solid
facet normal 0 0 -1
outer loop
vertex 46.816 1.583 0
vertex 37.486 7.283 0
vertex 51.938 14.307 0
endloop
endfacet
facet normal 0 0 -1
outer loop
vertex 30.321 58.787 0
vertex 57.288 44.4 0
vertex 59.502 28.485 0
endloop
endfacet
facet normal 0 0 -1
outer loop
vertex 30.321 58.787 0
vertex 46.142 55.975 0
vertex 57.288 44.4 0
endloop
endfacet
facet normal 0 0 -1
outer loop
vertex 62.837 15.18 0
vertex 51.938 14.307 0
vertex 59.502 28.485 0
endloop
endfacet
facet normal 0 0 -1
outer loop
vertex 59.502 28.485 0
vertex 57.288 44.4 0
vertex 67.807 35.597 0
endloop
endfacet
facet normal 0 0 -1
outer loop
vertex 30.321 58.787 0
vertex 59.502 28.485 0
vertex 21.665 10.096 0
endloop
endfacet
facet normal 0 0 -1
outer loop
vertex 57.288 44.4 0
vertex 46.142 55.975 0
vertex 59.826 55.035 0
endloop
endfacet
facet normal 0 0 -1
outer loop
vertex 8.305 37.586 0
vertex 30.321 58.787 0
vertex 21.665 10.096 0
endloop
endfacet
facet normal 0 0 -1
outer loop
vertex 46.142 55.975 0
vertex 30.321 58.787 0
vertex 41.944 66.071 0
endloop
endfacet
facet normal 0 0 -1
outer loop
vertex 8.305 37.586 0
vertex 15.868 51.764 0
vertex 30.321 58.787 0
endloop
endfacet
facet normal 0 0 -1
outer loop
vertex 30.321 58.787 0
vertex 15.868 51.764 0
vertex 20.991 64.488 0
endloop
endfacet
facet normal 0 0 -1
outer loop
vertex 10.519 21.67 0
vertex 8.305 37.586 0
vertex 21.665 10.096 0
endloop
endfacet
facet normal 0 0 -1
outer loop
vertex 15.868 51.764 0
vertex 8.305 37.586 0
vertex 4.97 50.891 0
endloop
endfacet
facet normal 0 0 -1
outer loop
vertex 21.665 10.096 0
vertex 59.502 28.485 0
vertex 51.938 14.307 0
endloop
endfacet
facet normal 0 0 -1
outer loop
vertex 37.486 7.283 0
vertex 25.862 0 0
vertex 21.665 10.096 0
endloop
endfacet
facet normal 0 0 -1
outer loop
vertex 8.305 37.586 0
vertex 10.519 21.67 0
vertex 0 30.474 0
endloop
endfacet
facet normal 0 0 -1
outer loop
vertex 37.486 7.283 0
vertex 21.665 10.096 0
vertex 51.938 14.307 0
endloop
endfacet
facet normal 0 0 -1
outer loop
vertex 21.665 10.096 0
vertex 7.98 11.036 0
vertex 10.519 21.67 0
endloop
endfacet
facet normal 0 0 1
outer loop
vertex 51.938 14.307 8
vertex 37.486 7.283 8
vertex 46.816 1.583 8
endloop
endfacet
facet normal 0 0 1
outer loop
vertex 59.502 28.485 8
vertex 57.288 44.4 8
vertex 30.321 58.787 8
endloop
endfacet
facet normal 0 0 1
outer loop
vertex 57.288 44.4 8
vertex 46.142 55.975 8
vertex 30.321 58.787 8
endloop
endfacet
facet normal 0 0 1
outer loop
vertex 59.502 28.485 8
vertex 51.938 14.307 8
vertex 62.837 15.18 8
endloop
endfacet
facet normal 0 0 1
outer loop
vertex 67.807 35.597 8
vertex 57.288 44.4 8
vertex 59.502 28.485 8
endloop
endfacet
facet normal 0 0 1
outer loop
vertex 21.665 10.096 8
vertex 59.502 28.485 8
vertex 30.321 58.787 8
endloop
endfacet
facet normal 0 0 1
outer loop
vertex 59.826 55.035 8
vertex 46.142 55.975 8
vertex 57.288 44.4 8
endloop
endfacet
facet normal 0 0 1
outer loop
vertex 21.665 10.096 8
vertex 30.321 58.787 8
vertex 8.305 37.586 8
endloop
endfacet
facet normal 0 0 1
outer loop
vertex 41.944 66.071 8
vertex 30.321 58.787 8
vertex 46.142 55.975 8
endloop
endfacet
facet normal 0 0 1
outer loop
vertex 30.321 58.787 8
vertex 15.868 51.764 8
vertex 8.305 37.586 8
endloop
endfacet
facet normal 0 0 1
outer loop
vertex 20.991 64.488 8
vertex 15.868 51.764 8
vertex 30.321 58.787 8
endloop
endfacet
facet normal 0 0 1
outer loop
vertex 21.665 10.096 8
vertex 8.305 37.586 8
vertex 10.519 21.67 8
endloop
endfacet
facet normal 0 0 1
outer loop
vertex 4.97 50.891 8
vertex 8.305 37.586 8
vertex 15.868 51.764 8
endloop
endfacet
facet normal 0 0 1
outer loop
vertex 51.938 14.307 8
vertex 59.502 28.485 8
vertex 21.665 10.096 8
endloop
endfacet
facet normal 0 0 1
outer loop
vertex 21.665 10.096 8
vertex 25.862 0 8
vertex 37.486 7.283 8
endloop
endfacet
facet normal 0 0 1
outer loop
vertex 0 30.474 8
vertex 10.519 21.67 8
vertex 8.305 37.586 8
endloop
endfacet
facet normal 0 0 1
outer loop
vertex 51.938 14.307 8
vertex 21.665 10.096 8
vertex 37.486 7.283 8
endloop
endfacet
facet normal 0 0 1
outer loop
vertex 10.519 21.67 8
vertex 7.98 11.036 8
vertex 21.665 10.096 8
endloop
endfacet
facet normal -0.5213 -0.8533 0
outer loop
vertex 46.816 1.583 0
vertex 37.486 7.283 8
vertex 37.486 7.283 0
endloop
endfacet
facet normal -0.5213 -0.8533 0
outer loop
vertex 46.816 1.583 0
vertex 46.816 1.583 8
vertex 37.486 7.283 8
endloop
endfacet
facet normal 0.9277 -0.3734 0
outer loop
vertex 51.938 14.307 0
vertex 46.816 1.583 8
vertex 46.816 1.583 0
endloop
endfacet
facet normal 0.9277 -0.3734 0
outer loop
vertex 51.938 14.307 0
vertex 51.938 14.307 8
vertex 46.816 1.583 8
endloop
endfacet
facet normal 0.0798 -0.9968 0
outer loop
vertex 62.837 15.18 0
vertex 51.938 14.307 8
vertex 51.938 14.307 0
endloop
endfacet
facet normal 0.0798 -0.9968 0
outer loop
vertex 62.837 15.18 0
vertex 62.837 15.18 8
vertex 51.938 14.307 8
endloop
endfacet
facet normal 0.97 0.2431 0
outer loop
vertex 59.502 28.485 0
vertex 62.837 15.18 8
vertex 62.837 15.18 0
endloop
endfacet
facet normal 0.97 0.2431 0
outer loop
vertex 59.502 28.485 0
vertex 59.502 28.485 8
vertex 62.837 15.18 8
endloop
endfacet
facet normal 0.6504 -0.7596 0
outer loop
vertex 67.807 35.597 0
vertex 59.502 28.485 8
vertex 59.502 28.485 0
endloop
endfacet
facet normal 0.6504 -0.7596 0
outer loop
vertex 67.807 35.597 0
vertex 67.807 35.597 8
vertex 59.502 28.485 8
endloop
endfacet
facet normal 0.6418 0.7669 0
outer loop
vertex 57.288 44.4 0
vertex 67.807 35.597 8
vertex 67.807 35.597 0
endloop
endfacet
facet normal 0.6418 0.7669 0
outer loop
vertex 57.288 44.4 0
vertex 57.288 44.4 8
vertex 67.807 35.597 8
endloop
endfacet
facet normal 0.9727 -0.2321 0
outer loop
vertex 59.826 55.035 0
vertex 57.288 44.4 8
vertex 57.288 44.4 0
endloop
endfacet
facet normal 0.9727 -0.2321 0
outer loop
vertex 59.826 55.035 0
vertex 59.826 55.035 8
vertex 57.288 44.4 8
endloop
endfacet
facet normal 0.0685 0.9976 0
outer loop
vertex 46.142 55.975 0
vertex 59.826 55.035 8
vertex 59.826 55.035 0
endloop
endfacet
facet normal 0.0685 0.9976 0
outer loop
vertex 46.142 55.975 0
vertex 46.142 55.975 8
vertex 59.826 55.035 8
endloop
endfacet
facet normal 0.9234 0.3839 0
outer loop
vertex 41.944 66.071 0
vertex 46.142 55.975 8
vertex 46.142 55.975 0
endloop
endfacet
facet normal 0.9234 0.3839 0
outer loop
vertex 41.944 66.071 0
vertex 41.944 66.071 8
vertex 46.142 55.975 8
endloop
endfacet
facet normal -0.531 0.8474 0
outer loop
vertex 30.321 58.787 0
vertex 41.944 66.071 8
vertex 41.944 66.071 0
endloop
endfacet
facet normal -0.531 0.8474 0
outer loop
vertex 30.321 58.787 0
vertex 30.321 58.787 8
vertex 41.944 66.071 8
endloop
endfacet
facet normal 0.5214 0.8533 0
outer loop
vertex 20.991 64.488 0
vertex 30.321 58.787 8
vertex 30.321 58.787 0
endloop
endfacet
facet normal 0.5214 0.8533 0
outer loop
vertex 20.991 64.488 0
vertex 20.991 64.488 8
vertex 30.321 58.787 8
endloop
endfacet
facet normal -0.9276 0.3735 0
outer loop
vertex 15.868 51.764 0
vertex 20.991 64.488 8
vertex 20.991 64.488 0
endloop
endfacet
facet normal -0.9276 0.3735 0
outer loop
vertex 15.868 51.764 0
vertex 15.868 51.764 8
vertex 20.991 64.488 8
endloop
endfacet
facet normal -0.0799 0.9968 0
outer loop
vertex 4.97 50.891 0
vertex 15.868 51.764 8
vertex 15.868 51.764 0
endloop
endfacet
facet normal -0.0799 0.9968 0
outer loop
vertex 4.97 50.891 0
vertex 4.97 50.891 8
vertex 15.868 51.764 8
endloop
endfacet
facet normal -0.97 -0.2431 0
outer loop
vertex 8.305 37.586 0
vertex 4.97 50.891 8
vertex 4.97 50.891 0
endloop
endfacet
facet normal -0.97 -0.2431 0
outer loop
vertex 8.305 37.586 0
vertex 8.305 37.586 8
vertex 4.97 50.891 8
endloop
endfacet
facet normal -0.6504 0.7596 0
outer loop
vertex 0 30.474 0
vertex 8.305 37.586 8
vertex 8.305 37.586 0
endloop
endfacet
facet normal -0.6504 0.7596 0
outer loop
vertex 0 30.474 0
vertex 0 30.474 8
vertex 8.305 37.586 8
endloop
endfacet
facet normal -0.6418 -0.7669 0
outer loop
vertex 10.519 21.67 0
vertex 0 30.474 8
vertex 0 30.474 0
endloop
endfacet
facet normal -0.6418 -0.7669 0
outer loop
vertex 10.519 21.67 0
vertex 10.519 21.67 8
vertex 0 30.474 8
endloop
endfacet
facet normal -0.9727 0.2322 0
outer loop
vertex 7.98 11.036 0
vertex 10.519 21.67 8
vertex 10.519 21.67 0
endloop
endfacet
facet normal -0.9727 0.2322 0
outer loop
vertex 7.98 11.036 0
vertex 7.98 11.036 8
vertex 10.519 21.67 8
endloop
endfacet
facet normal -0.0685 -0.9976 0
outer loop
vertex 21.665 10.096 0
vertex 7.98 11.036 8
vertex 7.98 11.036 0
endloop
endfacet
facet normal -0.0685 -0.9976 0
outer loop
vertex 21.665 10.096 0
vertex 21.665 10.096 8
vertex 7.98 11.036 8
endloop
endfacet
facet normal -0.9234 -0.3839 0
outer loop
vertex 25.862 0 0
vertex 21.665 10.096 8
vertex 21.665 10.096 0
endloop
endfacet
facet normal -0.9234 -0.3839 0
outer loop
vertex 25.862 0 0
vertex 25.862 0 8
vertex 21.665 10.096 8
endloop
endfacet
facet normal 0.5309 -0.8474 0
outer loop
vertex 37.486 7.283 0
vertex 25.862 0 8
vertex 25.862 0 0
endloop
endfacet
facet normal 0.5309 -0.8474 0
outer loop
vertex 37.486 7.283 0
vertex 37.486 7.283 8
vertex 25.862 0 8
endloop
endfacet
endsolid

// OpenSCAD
$fn = 32;

// ----------------------------------------------------------------------
// Chain sprocket: 10 teeth, 26 mm root radius
// ----------------------------------------------------------------------

// --- parameters (mm) ---
profile_height = 8;       // extrusion height
profile_points = 20;      // points of the closed outline

profile = [[59.502, 28.485], [67.807, 35.597], [57.288, 44.4], [59.826, 55.035], [46.142, 55.975], [41.944, 66.071], [30.321, 58.787], [20.991, 64.488], [15.868, 51.764], [4.97, 50.891], [8.305, 37.586], [0, 30.474], [10.519, 21.67], [7.98, 11.036], [21.665, 10.096], [25.862, 0], [37.486, 7.283], [46.816, 1.583], [51.938, 14.307], [62.837, 15.18]];  // single closed polygon, 20 points, counter clockwise

// --- the one profile operation ---
linear_extrude(height = profile_height) polygon(points = profile);
